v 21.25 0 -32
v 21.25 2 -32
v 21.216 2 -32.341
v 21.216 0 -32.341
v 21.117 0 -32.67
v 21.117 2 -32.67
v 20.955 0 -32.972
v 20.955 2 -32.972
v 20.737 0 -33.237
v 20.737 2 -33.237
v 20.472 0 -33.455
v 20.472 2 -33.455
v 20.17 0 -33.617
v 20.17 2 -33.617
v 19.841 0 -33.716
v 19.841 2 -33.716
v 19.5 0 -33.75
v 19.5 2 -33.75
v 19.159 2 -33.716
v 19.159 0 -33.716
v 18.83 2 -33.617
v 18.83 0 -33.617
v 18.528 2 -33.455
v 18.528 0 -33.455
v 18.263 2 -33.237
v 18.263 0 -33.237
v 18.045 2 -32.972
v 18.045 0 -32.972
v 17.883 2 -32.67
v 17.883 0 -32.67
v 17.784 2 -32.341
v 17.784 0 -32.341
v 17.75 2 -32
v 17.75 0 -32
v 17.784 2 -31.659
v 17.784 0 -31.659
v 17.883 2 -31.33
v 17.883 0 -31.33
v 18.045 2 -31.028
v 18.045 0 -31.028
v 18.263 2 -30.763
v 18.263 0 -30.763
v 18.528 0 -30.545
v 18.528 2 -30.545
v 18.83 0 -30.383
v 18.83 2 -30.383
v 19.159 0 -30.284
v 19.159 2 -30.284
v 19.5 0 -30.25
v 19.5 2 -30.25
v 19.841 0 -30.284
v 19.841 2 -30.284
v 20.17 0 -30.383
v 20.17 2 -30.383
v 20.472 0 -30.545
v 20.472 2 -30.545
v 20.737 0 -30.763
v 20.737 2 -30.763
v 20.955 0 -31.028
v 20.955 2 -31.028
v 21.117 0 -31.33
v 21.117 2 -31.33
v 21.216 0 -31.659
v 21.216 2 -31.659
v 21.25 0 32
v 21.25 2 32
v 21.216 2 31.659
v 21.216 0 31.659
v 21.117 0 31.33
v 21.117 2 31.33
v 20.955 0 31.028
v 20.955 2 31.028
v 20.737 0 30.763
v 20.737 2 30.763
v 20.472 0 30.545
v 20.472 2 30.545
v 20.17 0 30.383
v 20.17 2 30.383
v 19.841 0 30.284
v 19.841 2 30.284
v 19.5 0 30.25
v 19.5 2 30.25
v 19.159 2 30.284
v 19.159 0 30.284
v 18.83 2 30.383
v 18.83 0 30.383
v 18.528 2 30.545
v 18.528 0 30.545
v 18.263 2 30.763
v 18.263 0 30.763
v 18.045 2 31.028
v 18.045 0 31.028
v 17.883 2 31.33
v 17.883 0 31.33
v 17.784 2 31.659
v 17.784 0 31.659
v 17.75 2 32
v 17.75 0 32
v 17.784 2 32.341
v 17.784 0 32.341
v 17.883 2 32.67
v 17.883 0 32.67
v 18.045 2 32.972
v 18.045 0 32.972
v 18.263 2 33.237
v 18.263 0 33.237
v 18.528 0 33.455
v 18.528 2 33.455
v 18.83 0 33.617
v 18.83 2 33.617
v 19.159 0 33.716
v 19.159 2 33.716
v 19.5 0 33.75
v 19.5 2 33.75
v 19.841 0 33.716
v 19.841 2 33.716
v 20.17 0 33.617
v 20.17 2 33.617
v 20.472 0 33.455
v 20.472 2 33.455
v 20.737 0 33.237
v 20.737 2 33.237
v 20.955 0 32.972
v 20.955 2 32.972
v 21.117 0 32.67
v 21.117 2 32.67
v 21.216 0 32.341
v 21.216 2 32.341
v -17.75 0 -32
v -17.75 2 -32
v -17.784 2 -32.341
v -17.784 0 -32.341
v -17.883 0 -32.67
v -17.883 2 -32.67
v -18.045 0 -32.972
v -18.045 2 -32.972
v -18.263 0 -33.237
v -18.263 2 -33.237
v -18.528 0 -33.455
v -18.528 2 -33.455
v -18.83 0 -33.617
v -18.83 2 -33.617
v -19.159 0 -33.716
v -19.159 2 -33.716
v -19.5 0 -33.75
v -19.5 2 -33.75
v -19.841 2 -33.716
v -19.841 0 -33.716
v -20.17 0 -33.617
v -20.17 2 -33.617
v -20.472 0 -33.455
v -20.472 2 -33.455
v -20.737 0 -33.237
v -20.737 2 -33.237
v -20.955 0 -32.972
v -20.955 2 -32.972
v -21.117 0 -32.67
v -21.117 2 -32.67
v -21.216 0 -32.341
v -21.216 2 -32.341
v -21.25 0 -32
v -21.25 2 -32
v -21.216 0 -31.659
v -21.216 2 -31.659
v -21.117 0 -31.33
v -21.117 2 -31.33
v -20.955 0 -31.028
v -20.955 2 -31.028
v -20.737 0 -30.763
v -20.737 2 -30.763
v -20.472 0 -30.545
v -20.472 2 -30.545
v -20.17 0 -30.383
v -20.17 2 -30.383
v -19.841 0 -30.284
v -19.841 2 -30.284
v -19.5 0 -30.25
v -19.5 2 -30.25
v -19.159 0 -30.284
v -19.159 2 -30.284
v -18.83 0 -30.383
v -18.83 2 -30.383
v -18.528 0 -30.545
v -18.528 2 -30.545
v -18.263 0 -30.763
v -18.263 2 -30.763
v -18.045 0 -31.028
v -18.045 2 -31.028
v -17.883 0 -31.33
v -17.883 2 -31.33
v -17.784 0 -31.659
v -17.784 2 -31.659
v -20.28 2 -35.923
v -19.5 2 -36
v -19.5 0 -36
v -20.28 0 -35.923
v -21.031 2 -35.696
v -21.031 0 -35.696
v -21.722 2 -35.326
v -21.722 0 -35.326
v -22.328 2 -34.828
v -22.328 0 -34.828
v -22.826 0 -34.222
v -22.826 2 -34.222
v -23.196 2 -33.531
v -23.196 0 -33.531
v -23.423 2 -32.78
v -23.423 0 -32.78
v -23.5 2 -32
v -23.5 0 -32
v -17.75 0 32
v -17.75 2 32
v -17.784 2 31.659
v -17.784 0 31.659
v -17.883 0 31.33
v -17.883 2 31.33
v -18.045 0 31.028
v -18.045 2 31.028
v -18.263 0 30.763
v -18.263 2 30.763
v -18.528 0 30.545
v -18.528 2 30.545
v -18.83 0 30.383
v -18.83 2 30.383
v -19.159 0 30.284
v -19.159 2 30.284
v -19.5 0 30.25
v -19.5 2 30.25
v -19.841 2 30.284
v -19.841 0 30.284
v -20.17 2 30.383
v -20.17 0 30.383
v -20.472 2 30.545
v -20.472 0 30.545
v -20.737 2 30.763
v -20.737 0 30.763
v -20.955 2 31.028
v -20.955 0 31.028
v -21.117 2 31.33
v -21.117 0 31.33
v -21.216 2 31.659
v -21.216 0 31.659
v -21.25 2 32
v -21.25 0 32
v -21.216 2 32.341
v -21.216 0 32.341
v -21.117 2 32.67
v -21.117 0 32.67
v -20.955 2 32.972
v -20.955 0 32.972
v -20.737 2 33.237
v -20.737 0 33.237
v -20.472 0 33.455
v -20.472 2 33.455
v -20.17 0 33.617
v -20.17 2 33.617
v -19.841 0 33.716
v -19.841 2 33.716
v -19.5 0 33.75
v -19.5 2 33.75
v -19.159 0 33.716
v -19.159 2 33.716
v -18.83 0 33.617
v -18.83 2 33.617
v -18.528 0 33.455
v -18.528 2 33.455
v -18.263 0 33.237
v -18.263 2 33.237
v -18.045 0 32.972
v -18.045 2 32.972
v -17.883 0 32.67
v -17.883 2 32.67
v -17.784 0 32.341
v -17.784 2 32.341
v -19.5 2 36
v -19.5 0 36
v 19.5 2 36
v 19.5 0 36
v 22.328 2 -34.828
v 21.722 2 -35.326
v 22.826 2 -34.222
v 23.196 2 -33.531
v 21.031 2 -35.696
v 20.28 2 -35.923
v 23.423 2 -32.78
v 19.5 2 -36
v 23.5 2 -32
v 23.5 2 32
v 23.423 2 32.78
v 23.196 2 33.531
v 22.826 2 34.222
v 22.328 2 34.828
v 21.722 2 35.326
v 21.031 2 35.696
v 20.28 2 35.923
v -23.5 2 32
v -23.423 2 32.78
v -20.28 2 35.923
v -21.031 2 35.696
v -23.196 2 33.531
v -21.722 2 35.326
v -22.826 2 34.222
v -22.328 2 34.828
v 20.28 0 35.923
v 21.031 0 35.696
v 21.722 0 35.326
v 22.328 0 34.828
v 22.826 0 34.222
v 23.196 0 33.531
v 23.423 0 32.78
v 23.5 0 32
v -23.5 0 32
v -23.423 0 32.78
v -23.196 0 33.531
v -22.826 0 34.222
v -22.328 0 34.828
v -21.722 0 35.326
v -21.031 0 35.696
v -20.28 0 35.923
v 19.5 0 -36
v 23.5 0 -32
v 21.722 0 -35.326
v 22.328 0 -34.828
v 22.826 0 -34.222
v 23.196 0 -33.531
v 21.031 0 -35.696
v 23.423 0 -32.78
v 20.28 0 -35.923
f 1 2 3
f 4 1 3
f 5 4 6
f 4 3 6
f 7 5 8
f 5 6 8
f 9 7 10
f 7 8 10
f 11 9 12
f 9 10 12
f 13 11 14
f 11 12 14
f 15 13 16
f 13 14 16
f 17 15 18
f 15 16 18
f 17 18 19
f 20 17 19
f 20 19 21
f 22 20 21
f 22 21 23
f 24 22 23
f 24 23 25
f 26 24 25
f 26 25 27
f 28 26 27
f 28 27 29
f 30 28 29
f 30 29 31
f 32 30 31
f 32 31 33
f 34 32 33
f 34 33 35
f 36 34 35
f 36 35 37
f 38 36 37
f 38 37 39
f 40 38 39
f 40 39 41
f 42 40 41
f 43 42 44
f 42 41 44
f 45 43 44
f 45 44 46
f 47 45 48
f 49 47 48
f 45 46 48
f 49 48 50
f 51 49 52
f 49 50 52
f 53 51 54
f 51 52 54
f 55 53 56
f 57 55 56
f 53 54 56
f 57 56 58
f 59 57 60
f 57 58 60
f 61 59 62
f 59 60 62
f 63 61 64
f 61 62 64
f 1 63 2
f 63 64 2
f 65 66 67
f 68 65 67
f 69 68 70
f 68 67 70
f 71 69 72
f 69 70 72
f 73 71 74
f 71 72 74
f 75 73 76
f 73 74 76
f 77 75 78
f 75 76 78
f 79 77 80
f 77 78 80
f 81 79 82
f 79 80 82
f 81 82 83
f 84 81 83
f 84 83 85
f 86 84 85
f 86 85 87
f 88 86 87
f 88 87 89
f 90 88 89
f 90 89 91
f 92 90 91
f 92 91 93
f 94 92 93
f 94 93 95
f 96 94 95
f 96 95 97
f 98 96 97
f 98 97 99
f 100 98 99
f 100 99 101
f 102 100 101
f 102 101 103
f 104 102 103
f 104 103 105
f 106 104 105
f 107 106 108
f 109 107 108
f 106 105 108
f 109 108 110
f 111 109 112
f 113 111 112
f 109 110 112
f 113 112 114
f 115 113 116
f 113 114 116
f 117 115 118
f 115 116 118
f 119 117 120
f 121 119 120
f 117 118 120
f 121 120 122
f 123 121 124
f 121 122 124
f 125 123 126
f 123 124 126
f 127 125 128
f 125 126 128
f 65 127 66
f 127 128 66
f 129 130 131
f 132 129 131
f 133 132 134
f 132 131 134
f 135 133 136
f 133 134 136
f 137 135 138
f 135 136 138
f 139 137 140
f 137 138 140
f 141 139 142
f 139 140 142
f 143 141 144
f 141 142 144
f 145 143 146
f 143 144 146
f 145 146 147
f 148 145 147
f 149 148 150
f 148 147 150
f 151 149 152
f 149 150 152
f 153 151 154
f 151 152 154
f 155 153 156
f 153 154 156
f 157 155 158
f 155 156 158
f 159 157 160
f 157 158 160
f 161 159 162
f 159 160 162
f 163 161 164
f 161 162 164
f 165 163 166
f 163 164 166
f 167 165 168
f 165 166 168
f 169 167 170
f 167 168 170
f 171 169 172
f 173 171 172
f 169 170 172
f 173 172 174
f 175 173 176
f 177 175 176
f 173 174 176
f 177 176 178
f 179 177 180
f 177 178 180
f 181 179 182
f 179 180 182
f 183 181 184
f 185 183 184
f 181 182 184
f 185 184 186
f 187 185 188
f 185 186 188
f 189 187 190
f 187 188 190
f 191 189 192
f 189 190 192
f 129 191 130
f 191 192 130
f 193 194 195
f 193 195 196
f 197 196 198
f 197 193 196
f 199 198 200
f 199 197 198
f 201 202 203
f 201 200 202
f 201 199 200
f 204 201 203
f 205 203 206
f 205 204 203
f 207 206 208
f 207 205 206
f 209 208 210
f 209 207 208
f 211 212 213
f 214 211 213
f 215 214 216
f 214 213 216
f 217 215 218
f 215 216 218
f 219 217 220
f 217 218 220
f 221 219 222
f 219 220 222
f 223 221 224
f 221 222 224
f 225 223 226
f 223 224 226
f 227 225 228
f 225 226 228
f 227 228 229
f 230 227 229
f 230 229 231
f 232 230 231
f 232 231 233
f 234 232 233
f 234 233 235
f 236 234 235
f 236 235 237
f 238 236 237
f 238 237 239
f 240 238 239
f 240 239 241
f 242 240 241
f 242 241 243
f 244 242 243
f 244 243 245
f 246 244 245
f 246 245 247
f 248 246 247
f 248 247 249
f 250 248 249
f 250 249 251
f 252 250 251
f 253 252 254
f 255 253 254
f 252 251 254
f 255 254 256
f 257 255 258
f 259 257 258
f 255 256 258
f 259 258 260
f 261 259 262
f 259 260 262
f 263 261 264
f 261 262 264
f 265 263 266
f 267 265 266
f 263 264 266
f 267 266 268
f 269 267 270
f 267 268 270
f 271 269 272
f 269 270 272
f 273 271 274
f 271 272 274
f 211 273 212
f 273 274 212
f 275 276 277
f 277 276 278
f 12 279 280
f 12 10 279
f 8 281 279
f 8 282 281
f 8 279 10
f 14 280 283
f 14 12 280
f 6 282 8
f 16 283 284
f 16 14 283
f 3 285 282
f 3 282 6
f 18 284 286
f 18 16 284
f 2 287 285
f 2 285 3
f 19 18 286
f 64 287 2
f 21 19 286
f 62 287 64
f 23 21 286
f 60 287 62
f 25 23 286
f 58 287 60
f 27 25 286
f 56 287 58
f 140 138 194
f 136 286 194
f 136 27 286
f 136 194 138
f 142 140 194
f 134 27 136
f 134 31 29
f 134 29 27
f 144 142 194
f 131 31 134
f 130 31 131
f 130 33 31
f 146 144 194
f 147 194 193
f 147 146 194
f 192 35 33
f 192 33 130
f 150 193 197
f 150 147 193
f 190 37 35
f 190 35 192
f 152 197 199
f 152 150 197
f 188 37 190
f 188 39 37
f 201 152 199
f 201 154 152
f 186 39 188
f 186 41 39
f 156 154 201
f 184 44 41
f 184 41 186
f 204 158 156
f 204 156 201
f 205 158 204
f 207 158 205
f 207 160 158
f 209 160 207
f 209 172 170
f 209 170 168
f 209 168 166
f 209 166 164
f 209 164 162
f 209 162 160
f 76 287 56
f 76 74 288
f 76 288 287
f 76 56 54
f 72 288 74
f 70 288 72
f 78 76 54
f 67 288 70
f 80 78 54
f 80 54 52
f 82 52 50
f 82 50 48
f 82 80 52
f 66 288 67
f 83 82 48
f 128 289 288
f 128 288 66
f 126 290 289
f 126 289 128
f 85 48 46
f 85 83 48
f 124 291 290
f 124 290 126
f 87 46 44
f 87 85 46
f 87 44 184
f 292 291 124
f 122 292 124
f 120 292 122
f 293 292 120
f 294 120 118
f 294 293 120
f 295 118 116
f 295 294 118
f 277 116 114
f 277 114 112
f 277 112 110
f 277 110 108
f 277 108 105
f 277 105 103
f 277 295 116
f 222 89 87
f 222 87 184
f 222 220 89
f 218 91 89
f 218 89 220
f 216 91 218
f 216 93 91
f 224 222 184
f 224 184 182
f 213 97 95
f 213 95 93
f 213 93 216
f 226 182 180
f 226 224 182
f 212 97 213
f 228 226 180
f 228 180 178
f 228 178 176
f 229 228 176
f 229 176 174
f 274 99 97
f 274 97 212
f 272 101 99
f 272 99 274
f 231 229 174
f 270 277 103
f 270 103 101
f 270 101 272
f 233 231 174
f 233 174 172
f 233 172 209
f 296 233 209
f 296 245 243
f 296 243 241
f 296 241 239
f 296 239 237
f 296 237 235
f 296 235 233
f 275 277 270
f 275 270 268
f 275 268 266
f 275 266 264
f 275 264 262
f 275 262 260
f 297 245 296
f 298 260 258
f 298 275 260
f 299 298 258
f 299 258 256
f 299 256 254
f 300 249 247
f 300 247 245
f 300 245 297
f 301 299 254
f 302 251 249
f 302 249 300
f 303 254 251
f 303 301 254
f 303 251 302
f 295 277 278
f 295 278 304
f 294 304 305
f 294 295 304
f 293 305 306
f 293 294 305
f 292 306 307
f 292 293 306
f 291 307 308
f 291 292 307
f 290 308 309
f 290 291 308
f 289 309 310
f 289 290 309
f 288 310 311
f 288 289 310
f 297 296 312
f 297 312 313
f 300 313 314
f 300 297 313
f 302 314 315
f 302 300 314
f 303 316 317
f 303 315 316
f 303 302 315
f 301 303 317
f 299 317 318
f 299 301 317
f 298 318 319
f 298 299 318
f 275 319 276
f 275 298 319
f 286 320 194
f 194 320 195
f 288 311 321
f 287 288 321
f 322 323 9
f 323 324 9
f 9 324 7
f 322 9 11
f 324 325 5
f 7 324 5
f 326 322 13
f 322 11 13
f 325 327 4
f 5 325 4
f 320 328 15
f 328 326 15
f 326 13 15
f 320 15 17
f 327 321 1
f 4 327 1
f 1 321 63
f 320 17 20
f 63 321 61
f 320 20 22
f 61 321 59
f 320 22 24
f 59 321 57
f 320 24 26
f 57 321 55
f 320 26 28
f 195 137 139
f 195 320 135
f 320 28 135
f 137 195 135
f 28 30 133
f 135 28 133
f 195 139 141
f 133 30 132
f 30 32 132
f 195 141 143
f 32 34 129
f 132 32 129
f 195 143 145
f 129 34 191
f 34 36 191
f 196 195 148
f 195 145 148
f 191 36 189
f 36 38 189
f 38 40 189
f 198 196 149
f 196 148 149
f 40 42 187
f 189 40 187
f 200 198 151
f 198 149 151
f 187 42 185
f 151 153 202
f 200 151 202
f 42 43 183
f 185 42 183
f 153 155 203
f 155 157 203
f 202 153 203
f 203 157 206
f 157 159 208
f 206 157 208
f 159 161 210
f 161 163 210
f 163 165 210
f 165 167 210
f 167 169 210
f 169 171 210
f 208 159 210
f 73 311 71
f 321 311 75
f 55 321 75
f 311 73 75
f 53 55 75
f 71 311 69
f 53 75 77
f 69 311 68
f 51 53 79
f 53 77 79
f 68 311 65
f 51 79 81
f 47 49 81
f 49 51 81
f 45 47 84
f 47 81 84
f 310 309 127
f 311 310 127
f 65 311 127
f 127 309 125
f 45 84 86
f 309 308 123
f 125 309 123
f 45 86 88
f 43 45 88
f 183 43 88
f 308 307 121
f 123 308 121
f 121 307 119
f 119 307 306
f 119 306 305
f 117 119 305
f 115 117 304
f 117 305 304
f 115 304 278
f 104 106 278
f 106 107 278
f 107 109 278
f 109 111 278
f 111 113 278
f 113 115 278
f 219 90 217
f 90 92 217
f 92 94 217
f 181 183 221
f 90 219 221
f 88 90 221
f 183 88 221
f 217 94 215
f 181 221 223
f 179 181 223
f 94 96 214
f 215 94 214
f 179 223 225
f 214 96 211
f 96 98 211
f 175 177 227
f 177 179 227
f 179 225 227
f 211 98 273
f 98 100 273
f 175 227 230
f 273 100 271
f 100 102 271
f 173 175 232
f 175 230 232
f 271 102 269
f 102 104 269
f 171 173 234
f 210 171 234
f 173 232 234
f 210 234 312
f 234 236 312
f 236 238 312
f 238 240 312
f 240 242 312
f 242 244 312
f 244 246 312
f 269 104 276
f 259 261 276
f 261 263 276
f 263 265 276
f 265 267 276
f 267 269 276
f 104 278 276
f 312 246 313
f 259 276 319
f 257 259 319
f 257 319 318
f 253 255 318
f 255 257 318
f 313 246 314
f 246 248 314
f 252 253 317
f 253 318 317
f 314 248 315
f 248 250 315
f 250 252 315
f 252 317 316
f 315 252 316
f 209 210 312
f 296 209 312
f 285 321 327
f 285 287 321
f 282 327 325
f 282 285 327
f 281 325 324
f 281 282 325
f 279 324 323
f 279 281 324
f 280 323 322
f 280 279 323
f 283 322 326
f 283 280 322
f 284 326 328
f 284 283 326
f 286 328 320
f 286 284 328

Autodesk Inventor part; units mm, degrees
ref_plane "YZ Plane" through (0, 0, 0) normal (1, 0, 0) x (0, 1, 0)
ref_plane "XZ Plane" through (0, 0, 0) normal (0, 1, 0) x (-1, 0, 0)
ref_plane "XY Plane" through (0, 0, 0) normal (0, 0, 1) x (1, 0, 0)
sketch "Sketch1" plane through (0, 0, 0) normal (0, 1, 0) x (-1, 0, 0)
  line L0 (-23.5, 36) -> (-23.5, -36)
  line L1 (-23.5, -36) -> (23.5, -36)
  line L2 (23.5, -36) -> (23.5, 36)
  line L3 (23.5, 36) -> (-23.5, 36)
  line L4 (-23.5, 36) -> (23.5, -36) construction
  line L5 (-23.5, -36) -> (23.5, 36) construction
  point P0 (0, 0)
  dimension "d0" = 72
  dimension "d1" = 47
extrude "Extrusion1" add sketch "Sketch1" along normal blind 2
sketch "Sketch3" plane through (0, 2, 0) normal (0, 1, 0) x (1, 0, 0)
  line L0 (-23.5, 36) -> (-23.5, -36) projected
  line L1 (23.5, -36) -> (23.5, 36) projected
  line L2 (-23.535, 36.3293) -> (23.5, 36.3293) construction
  line L3 (23.5, 36.3293) -> (23.5, -36) construction
  line L4 (23.5, -36) -> (-23.535, -36) construction
  line L5 (-23.535, -36) -> (-23.535, 36.3293) construction
  point P0 (0, 0)
sketch "Sketch4" plane through (0, 2, 0) normal (0, 1, 0) x (1, 0, 0)
  line L0 (-23.5, 36) -> (-23.5, -36) projected
  line L1 (-23.5, -36) -> (23.5, -36) projected
  line L2 (23.5, -36) -> (23.5, 36) projected
  line L3 (23.5, 36) -> (-23.5, 36) projected
  point P0 (0, 0)
fillet "Fillet1" radius 4 4 edges at (23.5, 1, 36) (-23.5, 1, 36) (23.5, 1, -36) (-23.5, 1, -36)
decal "Decal1"
sketch "Sketch5" plane through (0, 2, 0) normal (0, 1, 0) x (1, 0, 0)
  line L0 (-19.5, 32) -> (-19.5, -32)
  line L1 (-19.5, -32) -> (19.5, -32)
  line L2 (19.5, -32) -> (19.5, 32)
  line L3 (19.5, 32) -> (-19.5, 32)
  line L4 (-19.5, 32) -> (19.5, -32) construction
  line L5 (-19.5, -32) -> (19.5, 32) construction
  circle A0 centre (-19.5, 32) radius 1.75
  line L6 (0, 32) -> (0, -32)
  line L7 (19.5, 0) -> (-19.5, 0)
  circle A1 centre (19.5, 32) radius 1.75
  circle A2 centre (-19.5, -32) radius 1.75
  circle A3 centre (19.5, -32) radius 1.75
  point P0 (0, 0)
  dimension "d37" = 39
  dimension "d38" = 64
  dimension "d39" = 3.5
extrude "Extrusion2" cut sketch "Sketch5" against normal through all contours L3 A0 L0 | L0 A0 L3 | A2 L1 L0 | L0 L1 A2 | A1 L2 L3 | L3 L2 A1 | A3 L2 L1 | L1 L2 A3
properties part number "ideaboard"
